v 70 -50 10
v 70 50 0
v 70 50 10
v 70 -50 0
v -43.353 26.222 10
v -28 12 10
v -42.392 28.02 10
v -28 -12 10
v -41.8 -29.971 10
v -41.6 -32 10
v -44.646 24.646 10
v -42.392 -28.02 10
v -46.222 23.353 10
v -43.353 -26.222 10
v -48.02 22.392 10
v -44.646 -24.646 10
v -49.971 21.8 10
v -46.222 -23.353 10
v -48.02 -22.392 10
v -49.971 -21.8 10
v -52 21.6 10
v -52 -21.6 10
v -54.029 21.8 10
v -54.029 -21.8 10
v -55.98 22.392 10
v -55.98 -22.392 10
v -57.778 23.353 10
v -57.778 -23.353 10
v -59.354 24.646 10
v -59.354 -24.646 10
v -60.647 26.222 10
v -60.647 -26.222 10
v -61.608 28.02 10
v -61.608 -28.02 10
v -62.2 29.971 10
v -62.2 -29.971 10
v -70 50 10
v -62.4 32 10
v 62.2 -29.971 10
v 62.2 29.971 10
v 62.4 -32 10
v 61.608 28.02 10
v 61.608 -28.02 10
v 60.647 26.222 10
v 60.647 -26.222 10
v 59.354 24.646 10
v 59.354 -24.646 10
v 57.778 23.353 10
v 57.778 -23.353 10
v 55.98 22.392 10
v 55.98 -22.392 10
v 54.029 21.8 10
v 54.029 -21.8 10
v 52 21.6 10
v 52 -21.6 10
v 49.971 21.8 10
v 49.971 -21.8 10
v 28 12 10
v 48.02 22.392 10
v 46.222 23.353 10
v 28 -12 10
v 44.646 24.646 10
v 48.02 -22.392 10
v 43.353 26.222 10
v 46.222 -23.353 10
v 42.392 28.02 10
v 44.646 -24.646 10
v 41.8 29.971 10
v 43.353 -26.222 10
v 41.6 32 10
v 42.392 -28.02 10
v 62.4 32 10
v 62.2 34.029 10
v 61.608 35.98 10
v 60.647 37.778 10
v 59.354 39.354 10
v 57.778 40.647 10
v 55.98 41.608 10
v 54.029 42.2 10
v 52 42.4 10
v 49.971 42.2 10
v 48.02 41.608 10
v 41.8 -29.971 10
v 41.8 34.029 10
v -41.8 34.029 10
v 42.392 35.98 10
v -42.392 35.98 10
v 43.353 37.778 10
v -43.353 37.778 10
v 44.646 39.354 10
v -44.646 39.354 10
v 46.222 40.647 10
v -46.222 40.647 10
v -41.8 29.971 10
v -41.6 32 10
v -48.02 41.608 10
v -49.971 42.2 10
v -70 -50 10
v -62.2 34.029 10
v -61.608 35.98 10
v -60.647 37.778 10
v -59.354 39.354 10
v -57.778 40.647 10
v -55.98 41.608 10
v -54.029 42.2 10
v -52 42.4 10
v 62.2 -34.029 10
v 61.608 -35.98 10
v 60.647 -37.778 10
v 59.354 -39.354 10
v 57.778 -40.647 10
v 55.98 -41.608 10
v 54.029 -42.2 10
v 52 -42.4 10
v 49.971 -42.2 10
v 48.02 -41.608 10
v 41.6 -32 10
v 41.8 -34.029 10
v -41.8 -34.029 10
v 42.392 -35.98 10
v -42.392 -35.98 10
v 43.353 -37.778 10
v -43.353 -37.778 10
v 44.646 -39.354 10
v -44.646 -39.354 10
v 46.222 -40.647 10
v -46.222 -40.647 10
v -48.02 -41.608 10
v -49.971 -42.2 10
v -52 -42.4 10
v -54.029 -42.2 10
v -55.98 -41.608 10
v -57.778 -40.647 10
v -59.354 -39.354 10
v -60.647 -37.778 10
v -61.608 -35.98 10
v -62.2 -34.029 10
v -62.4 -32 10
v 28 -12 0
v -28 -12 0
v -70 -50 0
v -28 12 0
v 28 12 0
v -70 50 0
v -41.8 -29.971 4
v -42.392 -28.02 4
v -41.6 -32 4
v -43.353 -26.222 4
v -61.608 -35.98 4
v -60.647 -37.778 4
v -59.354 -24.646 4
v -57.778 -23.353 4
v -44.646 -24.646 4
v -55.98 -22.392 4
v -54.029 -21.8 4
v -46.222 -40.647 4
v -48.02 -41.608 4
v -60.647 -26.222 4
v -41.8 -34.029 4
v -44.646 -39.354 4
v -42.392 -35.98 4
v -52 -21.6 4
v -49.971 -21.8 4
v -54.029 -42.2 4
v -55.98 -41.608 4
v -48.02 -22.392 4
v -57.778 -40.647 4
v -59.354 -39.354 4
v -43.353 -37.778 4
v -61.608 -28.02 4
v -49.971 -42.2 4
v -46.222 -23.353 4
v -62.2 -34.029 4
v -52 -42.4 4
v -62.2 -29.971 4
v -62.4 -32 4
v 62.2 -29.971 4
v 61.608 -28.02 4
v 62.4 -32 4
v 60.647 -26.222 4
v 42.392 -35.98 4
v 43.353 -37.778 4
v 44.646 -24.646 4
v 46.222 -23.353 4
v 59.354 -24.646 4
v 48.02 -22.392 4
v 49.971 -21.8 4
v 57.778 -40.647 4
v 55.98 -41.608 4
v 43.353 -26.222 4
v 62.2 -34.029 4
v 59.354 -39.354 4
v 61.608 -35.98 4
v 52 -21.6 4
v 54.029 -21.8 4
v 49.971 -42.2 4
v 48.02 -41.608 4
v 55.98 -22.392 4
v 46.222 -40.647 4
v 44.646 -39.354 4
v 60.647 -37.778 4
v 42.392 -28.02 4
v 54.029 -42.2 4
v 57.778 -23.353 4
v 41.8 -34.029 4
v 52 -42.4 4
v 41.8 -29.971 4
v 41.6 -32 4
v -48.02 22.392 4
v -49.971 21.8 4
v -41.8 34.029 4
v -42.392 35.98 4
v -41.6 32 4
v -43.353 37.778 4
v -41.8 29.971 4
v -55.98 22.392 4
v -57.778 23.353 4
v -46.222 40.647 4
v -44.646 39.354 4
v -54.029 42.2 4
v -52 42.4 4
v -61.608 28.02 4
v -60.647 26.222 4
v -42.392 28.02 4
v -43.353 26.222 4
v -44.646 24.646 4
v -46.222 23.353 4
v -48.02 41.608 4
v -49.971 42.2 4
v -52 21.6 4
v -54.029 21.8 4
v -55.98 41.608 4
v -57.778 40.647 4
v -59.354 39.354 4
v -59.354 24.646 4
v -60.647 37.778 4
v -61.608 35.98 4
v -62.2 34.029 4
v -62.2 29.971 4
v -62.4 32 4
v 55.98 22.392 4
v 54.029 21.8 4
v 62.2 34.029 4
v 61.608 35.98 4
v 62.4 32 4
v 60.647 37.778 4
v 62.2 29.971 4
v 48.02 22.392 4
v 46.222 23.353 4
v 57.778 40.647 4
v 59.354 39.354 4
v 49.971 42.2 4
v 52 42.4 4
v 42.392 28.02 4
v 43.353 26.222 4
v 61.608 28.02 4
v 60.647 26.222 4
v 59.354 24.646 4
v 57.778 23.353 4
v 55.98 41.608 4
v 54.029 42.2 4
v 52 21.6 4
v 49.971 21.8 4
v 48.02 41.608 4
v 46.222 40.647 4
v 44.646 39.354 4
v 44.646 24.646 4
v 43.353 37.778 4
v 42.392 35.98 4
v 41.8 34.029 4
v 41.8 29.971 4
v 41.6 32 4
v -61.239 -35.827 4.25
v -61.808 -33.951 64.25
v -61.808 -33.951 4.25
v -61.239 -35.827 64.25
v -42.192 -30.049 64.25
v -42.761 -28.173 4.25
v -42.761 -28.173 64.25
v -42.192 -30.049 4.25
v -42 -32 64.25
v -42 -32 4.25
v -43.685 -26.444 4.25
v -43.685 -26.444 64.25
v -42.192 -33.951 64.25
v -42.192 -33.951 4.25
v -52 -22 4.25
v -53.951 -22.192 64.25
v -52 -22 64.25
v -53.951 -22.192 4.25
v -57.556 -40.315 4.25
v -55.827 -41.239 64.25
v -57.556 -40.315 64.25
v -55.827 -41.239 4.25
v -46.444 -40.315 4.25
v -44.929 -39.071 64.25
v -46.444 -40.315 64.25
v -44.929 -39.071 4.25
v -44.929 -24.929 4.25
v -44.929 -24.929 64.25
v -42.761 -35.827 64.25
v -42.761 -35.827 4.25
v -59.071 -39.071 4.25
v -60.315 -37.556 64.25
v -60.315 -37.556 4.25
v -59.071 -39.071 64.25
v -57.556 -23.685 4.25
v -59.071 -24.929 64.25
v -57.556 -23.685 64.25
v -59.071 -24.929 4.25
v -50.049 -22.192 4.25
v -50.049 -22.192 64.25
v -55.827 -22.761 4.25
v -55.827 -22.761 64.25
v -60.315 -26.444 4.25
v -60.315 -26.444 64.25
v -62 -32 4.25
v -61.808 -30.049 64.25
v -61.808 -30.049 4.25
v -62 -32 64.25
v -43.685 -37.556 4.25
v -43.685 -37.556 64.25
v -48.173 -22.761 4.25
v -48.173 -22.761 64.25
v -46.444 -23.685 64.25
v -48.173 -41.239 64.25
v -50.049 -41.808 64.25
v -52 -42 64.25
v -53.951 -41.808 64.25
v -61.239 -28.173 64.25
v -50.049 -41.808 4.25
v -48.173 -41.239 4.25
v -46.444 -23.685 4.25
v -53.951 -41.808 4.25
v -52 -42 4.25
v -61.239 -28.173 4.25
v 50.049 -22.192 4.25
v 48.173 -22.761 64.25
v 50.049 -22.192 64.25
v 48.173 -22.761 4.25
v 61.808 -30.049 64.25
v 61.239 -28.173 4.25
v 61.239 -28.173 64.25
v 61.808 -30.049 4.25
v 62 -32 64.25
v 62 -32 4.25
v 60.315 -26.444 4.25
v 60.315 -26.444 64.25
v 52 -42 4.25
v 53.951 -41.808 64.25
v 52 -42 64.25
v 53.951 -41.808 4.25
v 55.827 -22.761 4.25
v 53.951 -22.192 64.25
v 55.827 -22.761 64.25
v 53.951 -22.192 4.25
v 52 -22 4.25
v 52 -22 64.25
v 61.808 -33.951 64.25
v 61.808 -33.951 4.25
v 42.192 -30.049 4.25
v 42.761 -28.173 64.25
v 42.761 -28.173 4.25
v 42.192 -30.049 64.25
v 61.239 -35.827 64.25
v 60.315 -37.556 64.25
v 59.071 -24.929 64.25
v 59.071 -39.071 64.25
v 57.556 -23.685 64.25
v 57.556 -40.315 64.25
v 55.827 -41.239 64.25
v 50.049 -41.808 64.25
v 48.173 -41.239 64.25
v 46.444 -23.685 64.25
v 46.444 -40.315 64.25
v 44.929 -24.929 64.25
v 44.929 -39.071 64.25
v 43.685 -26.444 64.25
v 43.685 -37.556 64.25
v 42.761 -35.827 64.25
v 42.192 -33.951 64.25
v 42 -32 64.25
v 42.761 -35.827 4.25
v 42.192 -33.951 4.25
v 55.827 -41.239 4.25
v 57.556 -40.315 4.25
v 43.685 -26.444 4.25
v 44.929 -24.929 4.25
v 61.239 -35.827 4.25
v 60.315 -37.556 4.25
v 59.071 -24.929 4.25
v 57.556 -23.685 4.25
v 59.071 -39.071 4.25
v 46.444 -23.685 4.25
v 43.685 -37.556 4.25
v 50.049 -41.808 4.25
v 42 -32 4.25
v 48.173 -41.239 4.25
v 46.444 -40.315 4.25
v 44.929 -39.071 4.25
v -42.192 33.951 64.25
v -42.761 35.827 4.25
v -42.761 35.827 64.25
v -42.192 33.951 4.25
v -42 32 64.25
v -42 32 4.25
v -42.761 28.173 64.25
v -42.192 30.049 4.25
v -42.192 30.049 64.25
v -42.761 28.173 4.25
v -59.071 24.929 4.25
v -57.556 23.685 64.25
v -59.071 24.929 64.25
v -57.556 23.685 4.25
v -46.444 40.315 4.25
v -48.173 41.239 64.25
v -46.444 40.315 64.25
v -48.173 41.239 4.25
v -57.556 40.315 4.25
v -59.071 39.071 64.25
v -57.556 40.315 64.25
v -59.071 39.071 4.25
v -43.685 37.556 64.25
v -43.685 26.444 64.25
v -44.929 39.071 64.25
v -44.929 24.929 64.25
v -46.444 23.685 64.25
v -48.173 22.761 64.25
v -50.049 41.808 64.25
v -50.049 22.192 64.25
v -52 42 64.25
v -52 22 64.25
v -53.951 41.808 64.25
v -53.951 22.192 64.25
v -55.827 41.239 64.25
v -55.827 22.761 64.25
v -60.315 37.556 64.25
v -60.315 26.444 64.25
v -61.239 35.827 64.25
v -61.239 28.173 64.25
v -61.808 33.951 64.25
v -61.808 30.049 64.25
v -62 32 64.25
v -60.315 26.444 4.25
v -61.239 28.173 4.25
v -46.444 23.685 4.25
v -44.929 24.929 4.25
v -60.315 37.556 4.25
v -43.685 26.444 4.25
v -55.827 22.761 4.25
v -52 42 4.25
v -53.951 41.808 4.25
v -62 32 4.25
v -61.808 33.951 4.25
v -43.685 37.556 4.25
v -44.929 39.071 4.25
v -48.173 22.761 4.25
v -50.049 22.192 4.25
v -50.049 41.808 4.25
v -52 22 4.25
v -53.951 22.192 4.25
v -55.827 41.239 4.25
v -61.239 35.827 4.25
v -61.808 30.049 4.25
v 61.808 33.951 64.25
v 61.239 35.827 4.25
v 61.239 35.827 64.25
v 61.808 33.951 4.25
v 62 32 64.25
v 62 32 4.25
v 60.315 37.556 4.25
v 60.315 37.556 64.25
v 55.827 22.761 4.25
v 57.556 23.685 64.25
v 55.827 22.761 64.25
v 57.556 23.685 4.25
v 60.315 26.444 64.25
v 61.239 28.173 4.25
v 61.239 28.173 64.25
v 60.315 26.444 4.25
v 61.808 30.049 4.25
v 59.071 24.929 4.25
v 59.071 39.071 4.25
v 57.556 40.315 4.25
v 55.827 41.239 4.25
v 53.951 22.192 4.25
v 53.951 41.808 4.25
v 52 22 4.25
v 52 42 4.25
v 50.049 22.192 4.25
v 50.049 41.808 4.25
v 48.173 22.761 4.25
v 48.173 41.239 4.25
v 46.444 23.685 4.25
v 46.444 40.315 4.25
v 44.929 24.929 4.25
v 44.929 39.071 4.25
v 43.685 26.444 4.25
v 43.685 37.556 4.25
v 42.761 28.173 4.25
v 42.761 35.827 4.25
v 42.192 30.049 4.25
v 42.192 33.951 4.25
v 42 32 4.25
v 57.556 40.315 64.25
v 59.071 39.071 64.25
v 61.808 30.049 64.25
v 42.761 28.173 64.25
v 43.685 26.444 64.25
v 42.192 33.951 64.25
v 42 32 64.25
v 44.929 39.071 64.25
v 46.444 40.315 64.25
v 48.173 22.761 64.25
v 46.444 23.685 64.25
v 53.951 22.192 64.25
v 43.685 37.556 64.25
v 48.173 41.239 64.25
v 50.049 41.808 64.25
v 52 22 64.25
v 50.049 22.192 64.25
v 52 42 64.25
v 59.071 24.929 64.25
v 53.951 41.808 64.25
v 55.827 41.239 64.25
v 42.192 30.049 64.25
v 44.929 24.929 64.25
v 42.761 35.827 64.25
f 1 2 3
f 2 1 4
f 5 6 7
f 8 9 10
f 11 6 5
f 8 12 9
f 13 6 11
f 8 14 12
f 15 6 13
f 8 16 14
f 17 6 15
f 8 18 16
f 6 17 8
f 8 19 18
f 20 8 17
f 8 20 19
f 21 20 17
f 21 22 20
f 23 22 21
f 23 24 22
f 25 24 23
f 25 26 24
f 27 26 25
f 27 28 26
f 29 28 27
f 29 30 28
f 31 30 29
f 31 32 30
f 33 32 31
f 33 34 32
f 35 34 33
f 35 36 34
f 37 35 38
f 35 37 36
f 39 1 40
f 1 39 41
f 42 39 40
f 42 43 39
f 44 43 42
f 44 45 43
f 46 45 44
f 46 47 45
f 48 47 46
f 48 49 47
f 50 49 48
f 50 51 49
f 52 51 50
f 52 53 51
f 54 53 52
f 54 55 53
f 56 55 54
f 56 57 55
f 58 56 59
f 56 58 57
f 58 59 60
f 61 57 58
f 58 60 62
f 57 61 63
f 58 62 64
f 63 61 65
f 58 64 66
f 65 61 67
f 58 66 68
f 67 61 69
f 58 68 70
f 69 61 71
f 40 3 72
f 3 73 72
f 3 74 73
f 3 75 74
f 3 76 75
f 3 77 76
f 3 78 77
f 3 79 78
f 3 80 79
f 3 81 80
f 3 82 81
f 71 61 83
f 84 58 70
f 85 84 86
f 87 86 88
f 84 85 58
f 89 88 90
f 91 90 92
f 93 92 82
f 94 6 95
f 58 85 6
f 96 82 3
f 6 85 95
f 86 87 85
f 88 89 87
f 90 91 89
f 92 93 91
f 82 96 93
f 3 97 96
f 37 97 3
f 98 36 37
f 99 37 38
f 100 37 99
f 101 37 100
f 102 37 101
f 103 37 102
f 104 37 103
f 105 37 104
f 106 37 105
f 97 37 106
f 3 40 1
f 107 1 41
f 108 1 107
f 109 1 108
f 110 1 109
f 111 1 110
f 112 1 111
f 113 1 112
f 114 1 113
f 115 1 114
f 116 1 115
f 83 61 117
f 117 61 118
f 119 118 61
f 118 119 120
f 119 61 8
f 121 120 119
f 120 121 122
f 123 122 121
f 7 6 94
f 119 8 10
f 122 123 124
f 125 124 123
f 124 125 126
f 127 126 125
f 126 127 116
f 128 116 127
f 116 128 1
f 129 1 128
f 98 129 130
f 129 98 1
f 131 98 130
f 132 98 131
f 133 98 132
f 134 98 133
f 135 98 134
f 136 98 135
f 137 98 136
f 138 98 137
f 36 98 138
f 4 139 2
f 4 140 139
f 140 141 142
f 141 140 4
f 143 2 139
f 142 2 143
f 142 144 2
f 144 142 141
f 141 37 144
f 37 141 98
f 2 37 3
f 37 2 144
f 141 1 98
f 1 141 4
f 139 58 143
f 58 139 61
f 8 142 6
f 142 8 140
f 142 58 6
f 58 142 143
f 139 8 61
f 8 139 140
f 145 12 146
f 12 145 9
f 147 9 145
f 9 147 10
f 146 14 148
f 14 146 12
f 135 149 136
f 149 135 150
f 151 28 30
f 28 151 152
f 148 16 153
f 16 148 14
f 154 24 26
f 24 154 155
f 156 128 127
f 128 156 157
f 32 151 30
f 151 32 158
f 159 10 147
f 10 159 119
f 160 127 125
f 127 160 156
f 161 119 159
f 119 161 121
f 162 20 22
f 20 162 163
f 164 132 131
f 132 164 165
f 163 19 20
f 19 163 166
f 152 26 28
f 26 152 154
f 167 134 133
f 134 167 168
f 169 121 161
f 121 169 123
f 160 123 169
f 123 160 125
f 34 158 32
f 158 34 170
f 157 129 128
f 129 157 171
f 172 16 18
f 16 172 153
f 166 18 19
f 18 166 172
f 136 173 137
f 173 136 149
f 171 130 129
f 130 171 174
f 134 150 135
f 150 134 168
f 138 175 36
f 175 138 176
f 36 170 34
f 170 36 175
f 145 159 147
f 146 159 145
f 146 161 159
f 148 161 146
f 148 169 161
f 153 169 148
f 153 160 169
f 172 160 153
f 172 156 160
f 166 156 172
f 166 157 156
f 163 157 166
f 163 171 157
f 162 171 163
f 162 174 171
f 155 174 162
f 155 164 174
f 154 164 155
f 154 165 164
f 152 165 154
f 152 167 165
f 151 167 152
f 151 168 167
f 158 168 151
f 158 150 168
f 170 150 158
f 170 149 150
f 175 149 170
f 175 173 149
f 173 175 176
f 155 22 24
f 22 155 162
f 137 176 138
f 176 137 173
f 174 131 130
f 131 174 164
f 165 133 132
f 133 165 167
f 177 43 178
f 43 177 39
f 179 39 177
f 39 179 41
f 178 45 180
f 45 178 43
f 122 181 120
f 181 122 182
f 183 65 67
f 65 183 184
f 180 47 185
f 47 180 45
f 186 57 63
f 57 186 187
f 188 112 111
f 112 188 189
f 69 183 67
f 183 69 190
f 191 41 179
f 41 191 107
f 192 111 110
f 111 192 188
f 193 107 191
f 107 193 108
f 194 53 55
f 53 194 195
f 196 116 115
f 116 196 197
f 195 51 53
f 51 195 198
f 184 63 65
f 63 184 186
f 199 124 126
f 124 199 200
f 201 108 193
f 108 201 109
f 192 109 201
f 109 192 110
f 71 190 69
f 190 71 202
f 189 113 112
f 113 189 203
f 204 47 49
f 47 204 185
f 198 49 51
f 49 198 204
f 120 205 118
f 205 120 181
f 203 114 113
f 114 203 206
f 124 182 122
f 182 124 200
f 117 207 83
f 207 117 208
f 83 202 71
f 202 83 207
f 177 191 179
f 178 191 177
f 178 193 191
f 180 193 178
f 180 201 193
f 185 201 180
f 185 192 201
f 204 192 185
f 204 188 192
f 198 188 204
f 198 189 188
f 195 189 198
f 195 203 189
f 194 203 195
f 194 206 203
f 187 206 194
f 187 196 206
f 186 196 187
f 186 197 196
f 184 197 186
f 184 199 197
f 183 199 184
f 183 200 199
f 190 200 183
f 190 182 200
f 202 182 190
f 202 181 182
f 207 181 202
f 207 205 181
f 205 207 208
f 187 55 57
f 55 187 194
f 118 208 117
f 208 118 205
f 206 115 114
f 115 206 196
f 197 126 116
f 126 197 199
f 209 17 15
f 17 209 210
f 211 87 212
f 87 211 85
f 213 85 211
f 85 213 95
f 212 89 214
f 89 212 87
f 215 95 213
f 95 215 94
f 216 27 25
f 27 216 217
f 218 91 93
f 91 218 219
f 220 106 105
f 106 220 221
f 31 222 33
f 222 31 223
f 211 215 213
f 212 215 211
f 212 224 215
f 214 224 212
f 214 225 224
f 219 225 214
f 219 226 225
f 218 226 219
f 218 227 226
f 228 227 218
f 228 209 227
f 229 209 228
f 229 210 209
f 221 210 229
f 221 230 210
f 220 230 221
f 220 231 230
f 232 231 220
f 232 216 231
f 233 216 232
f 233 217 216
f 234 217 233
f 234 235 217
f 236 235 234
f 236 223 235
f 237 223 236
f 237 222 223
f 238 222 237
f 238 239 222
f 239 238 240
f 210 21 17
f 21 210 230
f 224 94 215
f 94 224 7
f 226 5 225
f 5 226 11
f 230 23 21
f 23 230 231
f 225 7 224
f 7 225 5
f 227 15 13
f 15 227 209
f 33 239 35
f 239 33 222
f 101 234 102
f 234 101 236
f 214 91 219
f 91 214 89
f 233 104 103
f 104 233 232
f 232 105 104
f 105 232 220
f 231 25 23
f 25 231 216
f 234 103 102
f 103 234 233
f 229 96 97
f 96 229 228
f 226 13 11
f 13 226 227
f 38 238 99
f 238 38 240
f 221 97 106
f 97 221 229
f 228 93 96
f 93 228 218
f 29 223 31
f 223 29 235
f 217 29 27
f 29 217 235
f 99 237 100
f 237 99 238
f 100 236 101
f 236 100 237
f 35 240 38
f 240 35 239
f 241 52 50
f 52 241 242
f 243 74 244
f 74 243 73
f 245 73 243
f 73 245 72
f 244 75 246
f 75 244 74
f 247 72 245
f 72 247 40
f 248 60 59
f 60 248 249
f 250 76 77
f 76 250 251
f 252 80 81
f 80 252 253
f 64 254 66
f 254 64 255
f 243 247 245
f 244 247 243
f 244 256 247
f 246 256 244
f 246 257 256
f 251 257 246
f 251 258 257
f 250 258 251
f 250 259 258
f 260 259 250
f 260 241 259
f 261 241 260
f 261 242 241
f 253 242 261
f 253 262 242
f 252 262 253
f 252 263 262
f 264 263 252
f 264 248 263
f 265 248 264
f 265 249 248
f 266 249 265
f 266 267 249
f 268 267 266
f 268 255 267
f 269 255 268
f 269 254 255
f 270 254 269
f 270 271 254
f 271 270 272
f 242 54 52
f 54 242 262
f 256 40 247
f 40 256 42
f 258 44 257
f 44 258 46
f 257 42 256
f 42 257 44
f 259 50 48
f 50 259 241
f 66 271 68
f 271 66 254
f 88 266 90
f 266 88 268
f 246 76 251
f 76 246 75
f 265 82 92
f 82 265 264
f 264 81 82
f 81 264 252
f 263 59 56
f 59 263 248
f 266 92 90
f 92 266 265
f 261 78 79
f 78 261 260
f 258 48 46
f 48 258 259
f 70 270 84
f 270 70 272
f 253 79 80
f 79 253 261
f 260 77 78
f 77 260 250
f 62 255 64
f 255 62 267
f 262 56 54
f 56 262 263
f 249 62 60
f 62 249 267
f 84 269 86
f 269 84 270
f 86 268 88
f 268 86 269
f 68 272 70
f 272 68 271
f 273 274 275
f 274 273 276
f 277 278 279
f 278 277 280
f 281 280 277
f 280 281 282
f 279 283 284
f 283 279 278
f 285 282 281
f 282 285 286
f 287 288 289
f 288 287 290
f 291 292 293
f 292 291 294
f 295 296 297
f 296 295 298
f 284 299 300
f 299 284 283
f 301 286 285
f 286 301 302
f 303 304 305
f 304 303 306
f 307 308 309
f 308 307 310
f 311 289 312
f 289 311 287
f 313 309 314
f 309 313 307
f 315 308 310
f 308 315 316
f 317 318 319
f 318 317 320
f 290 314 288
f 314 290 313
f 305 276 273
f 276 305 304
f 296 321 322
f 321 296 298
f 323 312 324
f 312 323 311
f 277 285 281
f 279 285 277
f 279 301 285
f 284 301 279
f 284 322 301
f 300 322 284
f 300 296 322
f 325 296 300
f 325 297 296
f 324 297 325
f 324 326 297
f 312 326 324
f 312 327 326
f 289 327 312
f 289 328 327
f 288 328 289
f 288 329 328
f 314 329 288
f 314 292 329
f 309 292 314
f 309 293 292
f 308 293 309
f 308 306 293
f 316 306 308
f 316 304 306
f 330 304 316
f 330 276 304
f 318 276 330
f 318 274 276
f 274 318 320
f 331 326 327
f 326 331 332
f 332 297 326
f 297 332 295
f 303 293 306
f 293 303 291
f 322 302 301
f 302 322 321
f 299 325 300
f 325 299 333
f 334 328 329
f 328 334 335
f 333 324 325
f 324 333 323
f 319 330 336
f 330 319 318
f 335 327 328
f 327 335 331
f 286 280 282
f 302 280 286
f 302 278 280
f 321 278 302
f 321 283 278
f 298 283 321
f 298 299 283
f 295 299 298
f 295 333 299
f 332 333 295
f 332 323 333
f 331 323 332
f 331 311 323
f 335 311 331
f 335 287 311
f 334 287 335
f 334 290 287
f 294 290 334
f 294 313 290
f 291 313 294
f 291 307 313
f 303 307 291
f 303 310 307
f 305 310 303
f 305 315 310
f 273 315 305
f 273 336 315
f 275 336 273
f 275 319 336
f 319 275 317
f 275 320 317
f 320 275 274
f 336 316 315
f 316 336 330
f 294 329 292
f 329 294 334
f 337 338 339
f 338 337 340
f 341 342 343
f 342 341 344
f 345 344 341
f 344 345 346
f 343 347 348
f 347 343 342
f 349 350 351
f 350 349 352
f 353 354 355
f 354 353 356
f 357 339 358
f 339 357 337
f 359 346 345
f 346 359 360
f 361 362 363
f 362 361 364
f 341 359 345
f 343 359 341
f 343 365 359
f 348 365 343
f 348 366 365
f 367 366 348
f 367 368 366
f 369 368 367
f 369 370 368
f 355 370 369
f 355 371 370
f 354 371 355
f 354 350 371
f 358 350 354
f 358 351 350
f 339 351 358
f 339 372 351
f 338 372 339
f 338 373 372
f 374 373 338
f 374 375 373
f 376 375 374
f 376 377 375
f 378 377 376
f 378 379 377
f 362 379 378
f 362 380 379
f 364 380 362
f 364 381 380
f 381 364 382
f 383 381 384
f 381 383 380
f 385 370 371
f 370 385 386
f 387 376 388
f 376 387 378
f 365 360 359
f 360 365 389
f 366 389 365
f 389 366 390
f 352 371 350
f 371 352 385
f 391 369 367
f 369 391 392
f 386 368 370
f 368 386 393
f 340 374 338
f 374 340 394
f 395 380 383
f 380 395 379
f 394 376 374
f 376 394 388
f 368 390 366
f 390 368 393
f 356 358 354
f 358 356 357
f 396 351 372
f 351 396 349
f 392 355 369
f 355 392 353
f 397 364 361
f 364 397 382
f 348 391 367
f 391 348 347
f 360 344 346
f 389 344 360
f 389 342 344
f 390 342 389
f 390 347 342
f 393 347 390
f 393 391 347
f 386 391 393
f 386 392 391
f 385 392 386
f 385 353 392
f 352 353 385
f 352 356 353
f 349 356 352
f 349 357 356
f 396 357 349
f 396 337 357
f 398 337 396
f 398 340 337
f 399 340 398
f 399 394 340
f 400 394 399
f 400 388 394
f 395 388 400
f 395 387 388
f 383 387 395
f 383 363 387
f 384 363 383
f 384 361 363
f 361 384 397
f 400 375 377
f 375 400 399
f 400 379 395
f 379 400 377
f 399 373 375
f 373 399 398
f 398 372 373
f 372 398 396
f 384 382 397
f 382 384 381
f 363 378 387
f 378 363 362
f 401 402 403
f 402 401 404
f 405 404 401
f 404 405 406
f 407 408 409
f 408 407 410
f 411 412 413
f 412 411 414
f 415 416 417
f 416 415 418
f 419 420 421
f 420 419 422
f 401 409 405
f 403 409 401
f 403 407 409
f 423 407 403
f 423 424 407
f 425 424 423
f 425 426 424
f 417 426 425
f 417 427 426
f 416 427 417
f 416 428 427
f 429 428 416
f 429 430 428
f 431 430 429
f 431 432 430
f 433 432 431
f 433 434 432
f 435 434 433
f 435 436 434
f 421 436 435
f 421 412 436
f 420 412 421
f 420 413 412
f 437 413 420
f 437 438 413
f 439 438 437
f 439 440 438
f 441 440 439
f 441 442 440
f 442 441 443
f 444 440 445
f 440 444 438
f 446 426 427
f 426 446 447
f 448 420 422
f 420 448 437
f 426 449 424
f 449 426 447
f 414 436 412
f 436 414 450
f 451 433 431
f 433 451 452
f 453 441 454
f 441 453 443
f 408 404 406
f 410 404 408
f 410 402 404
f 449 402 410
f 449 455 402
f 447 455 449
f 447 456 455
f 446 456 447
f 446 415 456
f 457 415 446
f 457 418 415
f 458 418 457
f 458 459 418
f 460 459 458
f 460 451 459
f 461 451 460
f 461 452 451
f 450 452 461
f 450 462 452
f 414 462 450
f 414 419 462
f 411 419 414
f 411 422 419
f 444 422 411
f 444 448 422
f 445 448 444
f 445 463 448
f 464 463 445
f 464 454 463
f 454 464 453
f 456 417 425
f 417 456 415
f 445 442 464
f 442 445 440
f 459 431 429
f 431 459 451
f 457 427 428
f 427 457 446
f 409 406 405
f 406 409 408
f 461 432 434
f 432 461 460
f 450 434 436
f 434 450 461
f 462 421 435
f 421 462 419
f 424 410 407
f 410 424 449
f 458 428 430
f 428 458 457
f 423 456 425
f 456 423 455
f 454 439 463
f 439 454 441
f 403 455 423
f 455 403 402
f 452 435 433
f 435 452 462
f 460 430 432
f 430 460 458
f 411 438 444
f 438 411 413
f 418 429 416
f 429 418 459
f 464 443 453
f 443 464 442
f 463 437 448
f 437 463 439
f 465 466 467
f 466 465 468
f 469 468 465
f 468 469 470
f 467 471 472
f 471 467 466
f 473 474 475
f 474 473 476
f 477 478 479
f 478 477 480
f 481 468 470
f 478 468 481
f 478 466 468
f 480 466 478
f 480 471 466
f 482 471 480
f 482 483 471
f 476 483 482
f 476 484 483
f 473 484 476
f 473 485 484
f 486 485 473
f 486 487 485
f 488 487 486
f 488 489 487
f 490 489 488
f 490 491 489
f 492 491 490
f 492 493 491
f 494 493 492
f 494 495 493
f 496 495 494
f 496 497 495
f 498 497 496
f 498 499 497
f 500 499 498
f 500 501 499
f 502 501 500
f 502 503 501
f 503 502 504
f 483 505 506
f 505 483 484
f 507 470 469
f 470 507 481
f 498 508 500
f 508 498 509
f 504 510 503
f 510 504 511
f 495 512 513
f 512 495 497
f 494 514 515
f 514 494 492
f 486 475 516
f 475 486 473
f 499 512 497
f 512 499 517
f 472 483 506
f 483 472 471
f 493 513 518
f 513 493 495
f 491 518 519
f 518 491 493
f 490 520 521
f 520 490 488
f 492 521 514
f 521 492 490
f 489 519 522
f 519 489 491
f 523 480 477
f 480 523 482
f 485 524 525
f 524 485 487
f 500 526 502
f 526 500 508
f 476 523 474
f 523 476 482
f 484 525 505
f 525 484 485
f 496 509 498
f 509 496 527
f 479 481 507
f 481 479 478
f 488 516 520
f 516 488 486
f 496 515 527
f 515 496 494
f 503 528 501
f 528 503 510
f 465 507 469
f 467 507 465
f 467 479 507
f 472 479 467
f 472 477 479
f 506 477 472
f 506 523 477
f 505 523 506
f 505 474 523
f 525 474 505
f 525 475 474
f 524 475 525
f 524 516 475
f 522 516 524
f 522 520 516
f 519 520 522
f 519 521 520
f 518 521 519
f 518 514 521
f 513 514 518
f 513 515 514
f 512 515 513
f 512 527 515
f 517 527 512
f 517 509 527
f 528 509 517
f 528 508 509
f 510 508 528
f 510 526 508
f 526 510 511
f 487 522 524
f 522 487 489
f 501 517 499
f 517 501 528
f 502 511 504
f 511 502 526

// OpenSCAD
$fn = 32;

// ------------------------------------------------------------------------
// Frame with four posts: 140 x 100 mm frame, four d20 posts
// Every part is its own module, assembly() places them once.
// ------------------------------------------------------------------------

// --- part 1 ---
module base_frame() {
  difference() {
    translate([-70, -50, 0]) cube([140, 100, 10]);
    translate([-28, -12, -1]) cube([56, 24, 12]);
    translate([-52, -32, 4]) cylinder(h = 7, d = 20.8);
    translate([52, -32, 4]) cylinder(h = 7, d = 20.8);
    translate([-52, 32, 4]) cylinder(h = 7, d = 20.8);
    translate([52, 32, 4]) cylinder(h = 7, d = 20.8);
  }
}

// --- part 2 ---
module post1() {
  cylinder(h = 60, d = 20);
}

// --- part 3 ---
module post2() {
  cylinder(h = 60, d = 20);
}

// --- part 4 ---
module post3() {
  cylinder(h = 60, d = 20);
}

// --- part 5 ---
module post4() {
  cylinder(h = 60, d = 20);
}

// --- assembly ---
module assembly() {
  translate([0, 0, 0]) rotate([0, 0, 0]) base_frame();
  translate([-52, -32, 4.25]) rotate([0, 0, 0]) post1();
  translate([52, -32, 4.25]) rotate([0, 0, 0]) post2();
  translate([-52, 32, 4.25]) rotate([0, 0, 0]) post3();
  translate([52, 32, 4.25]) rotate([0, 0, 0]) post4();
}

assembly();
